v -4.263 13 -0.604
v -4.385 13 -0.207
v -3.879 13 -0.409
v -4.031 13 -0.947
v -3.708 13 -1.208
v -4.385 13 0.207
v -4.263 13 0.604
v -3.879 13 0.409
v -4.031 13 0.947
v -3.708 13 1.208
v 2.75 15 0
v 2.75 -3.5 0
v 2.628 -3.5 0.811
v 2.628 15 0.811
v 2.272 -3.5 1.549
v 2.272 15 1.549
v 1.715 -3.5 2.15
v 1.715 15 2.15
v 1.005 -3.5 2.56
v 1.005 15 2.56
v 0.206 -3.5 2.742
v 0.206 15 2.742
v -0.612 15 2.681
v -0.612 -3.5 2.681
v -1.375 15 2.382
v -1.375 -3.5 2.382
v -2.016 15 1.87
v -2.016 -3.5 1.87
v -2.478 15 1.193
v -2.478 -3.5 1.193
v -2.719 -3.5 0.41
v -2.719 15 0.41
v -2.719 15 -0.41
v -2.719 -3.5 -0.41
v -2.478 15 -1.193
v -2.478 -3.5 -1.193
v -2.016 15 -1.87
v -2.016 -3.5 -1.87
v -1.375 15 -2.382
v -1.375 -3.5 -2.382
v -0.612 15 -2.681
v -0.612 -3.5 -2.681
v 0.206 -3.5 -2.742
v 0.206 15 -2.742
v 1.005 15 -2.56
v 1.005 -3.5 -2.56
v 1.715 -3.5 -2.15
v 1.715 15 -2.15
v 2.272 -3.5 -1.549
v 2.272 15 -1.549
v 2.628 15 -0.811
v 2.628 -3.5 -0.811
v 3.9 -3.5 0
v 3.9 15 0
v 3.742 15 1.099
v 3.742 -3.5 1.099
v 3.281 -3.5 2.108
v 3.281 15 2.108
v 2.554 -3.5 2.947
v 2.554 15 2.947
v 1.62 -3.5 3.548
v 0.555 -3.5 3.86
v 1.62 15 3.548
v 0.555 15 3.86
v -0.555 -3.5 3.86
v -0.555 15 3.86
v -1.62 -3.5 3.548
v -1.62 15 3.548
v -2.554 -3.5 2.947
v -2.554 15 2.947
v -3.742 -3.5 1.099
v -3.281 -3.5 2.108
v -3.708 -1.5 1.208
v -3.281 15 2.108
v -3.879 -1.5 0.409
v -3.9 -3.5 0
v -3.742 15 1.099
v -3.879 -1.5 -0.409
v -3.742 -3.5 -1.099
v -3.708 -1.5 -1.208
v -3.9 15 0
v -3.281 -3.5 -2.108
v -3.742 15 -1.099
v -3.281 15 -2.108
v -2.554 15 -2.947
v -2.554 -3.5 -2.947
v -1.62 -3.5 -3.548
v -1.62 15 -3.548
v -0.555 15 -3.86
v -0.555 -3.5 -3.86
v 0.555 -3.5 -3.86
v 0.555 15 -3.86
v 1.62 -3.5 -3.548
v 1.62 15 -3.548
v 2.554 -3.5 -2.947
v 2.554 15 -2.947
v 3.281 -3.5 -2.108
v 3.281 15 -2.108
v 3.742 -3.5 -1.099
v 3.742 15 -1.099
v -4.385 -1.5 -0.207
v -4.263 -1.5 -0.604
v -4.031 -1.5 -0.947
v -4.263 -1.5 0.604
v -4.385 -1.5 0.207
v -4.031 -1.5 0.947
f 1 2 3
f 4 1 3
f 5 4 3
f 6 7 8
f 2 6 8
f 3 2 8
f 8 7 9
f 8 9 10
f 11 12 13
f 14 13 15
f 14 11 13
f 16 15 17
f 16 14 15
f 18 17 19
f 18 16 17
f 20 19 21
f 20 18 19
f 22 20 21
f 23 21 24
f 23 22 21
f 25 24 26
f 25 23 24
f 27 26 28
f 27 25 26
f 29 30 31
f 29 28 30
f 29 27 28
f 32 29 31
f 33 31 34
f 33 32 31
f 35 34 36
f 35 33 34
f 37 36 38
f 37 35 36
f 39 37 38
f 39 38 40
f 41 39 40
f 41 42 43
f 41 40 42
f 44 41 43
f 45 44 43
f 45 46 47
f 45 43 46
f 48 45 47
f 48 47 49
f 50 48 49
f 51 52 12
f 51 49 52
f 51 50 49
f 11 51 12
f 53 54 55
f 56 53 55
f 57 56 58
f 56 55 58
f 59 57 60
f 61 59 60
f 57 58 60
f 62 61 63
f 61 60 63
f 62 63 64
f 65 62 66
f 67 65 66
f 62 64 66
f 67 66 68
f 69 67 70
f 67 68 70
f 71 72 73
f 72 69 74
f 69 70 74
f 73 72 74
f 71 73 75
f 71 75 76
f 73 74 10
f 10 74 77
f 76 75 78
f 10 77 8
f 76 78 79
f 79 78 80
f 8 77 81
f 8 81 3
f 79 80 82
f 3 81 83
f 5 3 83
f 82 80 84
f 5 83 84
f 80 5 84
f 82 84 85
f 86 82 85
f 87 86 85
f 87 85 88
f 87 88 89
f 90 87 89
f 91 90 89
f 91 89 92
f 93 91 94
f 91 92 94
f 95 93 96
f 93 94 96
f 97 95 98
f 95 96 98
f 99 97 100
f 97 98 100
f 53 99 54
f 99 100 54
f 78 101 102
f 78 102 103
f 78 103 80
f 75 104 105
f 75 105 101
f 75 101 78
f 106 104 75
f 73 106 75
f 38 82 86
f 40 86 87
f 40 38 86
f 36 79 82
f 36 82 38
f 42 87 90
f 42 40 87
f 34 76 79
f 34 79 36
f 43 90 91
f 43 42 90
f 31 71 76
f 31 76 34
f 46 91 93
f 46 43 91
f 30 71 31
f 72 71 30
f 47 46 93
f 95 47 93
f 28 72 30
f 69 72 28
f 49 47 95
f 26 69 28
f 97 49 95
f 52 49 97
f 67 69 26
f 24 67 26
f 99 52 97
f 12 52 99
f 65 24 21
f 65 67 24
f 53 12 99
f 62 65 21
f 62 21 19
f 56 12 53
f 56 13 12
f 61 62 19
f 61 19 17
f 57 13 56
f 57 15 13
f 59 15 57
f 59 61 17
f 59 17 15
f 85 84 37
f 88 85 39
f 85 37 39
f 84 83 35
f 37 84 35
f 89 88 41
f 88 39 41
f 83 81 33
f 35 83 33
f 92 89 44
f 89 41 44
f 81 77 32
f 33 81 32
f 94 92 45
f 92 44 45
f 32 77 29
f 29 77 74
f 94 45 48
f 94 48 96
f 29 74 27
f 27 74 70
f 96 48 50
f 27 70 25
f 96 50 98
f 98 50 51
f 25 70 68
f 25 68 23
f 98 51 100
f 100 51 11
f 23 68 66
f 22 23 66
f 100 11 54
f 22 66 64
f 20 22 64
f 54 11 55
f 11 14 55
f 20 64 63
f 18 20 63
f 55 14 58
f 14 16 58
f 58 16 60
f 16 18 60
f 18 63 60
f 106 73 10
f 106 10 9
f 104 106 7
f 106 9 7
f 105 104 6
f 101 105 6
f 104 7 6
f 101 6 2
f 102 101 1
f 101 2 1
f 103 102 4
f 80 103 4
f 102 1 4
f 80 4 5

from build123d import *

# Parameters (mm, degrees)
SKETCH248_R          = 3.9
PAD125_DEPTH         = 18.5
SKETCH249_R          = 1.4
PAD126_DEPTH         = 14.5
SKETCH252_R          = 2.75
POCKET034_DEPTH      = 0.001
POCKET034_DEPTH_BACK = 18.501


with BuildPart() as part:
    # Sketch248 → Pad125 (new body)
    with BuildSketch(Plane.XZ):
        Circle(SKETCH248_R)
    extrude(amount=PAD125_DEPTH)

    # Sketch249 → Pad126 (join)
    with BuildSketch(Plane.XZ.offset(2)):
        with Locations((-3, 0)):
            Circle(SKETCH249_R)
    extrude(amount=PAD126_DEPTH)

    # Sketch252 → Pocket034 (cut, two sides)
    with BuildSketch(Plane.XZ) as pocket034_sk:
        Circle(SKETCH252_R)
    extrude(amount=-POCKET034_DEPTH, mode=Mode.SUBTRACT)
    extrude(pocket034_sk.sketch, amount=POCKET034_DEPTH_BACK, mode=Mode.SUBTRACT)


with BuildPart() as part_1:
    # Body102 placement: moved
    add(part.part.moved(Location((0, 15, 0))))


solid = part_1.part
